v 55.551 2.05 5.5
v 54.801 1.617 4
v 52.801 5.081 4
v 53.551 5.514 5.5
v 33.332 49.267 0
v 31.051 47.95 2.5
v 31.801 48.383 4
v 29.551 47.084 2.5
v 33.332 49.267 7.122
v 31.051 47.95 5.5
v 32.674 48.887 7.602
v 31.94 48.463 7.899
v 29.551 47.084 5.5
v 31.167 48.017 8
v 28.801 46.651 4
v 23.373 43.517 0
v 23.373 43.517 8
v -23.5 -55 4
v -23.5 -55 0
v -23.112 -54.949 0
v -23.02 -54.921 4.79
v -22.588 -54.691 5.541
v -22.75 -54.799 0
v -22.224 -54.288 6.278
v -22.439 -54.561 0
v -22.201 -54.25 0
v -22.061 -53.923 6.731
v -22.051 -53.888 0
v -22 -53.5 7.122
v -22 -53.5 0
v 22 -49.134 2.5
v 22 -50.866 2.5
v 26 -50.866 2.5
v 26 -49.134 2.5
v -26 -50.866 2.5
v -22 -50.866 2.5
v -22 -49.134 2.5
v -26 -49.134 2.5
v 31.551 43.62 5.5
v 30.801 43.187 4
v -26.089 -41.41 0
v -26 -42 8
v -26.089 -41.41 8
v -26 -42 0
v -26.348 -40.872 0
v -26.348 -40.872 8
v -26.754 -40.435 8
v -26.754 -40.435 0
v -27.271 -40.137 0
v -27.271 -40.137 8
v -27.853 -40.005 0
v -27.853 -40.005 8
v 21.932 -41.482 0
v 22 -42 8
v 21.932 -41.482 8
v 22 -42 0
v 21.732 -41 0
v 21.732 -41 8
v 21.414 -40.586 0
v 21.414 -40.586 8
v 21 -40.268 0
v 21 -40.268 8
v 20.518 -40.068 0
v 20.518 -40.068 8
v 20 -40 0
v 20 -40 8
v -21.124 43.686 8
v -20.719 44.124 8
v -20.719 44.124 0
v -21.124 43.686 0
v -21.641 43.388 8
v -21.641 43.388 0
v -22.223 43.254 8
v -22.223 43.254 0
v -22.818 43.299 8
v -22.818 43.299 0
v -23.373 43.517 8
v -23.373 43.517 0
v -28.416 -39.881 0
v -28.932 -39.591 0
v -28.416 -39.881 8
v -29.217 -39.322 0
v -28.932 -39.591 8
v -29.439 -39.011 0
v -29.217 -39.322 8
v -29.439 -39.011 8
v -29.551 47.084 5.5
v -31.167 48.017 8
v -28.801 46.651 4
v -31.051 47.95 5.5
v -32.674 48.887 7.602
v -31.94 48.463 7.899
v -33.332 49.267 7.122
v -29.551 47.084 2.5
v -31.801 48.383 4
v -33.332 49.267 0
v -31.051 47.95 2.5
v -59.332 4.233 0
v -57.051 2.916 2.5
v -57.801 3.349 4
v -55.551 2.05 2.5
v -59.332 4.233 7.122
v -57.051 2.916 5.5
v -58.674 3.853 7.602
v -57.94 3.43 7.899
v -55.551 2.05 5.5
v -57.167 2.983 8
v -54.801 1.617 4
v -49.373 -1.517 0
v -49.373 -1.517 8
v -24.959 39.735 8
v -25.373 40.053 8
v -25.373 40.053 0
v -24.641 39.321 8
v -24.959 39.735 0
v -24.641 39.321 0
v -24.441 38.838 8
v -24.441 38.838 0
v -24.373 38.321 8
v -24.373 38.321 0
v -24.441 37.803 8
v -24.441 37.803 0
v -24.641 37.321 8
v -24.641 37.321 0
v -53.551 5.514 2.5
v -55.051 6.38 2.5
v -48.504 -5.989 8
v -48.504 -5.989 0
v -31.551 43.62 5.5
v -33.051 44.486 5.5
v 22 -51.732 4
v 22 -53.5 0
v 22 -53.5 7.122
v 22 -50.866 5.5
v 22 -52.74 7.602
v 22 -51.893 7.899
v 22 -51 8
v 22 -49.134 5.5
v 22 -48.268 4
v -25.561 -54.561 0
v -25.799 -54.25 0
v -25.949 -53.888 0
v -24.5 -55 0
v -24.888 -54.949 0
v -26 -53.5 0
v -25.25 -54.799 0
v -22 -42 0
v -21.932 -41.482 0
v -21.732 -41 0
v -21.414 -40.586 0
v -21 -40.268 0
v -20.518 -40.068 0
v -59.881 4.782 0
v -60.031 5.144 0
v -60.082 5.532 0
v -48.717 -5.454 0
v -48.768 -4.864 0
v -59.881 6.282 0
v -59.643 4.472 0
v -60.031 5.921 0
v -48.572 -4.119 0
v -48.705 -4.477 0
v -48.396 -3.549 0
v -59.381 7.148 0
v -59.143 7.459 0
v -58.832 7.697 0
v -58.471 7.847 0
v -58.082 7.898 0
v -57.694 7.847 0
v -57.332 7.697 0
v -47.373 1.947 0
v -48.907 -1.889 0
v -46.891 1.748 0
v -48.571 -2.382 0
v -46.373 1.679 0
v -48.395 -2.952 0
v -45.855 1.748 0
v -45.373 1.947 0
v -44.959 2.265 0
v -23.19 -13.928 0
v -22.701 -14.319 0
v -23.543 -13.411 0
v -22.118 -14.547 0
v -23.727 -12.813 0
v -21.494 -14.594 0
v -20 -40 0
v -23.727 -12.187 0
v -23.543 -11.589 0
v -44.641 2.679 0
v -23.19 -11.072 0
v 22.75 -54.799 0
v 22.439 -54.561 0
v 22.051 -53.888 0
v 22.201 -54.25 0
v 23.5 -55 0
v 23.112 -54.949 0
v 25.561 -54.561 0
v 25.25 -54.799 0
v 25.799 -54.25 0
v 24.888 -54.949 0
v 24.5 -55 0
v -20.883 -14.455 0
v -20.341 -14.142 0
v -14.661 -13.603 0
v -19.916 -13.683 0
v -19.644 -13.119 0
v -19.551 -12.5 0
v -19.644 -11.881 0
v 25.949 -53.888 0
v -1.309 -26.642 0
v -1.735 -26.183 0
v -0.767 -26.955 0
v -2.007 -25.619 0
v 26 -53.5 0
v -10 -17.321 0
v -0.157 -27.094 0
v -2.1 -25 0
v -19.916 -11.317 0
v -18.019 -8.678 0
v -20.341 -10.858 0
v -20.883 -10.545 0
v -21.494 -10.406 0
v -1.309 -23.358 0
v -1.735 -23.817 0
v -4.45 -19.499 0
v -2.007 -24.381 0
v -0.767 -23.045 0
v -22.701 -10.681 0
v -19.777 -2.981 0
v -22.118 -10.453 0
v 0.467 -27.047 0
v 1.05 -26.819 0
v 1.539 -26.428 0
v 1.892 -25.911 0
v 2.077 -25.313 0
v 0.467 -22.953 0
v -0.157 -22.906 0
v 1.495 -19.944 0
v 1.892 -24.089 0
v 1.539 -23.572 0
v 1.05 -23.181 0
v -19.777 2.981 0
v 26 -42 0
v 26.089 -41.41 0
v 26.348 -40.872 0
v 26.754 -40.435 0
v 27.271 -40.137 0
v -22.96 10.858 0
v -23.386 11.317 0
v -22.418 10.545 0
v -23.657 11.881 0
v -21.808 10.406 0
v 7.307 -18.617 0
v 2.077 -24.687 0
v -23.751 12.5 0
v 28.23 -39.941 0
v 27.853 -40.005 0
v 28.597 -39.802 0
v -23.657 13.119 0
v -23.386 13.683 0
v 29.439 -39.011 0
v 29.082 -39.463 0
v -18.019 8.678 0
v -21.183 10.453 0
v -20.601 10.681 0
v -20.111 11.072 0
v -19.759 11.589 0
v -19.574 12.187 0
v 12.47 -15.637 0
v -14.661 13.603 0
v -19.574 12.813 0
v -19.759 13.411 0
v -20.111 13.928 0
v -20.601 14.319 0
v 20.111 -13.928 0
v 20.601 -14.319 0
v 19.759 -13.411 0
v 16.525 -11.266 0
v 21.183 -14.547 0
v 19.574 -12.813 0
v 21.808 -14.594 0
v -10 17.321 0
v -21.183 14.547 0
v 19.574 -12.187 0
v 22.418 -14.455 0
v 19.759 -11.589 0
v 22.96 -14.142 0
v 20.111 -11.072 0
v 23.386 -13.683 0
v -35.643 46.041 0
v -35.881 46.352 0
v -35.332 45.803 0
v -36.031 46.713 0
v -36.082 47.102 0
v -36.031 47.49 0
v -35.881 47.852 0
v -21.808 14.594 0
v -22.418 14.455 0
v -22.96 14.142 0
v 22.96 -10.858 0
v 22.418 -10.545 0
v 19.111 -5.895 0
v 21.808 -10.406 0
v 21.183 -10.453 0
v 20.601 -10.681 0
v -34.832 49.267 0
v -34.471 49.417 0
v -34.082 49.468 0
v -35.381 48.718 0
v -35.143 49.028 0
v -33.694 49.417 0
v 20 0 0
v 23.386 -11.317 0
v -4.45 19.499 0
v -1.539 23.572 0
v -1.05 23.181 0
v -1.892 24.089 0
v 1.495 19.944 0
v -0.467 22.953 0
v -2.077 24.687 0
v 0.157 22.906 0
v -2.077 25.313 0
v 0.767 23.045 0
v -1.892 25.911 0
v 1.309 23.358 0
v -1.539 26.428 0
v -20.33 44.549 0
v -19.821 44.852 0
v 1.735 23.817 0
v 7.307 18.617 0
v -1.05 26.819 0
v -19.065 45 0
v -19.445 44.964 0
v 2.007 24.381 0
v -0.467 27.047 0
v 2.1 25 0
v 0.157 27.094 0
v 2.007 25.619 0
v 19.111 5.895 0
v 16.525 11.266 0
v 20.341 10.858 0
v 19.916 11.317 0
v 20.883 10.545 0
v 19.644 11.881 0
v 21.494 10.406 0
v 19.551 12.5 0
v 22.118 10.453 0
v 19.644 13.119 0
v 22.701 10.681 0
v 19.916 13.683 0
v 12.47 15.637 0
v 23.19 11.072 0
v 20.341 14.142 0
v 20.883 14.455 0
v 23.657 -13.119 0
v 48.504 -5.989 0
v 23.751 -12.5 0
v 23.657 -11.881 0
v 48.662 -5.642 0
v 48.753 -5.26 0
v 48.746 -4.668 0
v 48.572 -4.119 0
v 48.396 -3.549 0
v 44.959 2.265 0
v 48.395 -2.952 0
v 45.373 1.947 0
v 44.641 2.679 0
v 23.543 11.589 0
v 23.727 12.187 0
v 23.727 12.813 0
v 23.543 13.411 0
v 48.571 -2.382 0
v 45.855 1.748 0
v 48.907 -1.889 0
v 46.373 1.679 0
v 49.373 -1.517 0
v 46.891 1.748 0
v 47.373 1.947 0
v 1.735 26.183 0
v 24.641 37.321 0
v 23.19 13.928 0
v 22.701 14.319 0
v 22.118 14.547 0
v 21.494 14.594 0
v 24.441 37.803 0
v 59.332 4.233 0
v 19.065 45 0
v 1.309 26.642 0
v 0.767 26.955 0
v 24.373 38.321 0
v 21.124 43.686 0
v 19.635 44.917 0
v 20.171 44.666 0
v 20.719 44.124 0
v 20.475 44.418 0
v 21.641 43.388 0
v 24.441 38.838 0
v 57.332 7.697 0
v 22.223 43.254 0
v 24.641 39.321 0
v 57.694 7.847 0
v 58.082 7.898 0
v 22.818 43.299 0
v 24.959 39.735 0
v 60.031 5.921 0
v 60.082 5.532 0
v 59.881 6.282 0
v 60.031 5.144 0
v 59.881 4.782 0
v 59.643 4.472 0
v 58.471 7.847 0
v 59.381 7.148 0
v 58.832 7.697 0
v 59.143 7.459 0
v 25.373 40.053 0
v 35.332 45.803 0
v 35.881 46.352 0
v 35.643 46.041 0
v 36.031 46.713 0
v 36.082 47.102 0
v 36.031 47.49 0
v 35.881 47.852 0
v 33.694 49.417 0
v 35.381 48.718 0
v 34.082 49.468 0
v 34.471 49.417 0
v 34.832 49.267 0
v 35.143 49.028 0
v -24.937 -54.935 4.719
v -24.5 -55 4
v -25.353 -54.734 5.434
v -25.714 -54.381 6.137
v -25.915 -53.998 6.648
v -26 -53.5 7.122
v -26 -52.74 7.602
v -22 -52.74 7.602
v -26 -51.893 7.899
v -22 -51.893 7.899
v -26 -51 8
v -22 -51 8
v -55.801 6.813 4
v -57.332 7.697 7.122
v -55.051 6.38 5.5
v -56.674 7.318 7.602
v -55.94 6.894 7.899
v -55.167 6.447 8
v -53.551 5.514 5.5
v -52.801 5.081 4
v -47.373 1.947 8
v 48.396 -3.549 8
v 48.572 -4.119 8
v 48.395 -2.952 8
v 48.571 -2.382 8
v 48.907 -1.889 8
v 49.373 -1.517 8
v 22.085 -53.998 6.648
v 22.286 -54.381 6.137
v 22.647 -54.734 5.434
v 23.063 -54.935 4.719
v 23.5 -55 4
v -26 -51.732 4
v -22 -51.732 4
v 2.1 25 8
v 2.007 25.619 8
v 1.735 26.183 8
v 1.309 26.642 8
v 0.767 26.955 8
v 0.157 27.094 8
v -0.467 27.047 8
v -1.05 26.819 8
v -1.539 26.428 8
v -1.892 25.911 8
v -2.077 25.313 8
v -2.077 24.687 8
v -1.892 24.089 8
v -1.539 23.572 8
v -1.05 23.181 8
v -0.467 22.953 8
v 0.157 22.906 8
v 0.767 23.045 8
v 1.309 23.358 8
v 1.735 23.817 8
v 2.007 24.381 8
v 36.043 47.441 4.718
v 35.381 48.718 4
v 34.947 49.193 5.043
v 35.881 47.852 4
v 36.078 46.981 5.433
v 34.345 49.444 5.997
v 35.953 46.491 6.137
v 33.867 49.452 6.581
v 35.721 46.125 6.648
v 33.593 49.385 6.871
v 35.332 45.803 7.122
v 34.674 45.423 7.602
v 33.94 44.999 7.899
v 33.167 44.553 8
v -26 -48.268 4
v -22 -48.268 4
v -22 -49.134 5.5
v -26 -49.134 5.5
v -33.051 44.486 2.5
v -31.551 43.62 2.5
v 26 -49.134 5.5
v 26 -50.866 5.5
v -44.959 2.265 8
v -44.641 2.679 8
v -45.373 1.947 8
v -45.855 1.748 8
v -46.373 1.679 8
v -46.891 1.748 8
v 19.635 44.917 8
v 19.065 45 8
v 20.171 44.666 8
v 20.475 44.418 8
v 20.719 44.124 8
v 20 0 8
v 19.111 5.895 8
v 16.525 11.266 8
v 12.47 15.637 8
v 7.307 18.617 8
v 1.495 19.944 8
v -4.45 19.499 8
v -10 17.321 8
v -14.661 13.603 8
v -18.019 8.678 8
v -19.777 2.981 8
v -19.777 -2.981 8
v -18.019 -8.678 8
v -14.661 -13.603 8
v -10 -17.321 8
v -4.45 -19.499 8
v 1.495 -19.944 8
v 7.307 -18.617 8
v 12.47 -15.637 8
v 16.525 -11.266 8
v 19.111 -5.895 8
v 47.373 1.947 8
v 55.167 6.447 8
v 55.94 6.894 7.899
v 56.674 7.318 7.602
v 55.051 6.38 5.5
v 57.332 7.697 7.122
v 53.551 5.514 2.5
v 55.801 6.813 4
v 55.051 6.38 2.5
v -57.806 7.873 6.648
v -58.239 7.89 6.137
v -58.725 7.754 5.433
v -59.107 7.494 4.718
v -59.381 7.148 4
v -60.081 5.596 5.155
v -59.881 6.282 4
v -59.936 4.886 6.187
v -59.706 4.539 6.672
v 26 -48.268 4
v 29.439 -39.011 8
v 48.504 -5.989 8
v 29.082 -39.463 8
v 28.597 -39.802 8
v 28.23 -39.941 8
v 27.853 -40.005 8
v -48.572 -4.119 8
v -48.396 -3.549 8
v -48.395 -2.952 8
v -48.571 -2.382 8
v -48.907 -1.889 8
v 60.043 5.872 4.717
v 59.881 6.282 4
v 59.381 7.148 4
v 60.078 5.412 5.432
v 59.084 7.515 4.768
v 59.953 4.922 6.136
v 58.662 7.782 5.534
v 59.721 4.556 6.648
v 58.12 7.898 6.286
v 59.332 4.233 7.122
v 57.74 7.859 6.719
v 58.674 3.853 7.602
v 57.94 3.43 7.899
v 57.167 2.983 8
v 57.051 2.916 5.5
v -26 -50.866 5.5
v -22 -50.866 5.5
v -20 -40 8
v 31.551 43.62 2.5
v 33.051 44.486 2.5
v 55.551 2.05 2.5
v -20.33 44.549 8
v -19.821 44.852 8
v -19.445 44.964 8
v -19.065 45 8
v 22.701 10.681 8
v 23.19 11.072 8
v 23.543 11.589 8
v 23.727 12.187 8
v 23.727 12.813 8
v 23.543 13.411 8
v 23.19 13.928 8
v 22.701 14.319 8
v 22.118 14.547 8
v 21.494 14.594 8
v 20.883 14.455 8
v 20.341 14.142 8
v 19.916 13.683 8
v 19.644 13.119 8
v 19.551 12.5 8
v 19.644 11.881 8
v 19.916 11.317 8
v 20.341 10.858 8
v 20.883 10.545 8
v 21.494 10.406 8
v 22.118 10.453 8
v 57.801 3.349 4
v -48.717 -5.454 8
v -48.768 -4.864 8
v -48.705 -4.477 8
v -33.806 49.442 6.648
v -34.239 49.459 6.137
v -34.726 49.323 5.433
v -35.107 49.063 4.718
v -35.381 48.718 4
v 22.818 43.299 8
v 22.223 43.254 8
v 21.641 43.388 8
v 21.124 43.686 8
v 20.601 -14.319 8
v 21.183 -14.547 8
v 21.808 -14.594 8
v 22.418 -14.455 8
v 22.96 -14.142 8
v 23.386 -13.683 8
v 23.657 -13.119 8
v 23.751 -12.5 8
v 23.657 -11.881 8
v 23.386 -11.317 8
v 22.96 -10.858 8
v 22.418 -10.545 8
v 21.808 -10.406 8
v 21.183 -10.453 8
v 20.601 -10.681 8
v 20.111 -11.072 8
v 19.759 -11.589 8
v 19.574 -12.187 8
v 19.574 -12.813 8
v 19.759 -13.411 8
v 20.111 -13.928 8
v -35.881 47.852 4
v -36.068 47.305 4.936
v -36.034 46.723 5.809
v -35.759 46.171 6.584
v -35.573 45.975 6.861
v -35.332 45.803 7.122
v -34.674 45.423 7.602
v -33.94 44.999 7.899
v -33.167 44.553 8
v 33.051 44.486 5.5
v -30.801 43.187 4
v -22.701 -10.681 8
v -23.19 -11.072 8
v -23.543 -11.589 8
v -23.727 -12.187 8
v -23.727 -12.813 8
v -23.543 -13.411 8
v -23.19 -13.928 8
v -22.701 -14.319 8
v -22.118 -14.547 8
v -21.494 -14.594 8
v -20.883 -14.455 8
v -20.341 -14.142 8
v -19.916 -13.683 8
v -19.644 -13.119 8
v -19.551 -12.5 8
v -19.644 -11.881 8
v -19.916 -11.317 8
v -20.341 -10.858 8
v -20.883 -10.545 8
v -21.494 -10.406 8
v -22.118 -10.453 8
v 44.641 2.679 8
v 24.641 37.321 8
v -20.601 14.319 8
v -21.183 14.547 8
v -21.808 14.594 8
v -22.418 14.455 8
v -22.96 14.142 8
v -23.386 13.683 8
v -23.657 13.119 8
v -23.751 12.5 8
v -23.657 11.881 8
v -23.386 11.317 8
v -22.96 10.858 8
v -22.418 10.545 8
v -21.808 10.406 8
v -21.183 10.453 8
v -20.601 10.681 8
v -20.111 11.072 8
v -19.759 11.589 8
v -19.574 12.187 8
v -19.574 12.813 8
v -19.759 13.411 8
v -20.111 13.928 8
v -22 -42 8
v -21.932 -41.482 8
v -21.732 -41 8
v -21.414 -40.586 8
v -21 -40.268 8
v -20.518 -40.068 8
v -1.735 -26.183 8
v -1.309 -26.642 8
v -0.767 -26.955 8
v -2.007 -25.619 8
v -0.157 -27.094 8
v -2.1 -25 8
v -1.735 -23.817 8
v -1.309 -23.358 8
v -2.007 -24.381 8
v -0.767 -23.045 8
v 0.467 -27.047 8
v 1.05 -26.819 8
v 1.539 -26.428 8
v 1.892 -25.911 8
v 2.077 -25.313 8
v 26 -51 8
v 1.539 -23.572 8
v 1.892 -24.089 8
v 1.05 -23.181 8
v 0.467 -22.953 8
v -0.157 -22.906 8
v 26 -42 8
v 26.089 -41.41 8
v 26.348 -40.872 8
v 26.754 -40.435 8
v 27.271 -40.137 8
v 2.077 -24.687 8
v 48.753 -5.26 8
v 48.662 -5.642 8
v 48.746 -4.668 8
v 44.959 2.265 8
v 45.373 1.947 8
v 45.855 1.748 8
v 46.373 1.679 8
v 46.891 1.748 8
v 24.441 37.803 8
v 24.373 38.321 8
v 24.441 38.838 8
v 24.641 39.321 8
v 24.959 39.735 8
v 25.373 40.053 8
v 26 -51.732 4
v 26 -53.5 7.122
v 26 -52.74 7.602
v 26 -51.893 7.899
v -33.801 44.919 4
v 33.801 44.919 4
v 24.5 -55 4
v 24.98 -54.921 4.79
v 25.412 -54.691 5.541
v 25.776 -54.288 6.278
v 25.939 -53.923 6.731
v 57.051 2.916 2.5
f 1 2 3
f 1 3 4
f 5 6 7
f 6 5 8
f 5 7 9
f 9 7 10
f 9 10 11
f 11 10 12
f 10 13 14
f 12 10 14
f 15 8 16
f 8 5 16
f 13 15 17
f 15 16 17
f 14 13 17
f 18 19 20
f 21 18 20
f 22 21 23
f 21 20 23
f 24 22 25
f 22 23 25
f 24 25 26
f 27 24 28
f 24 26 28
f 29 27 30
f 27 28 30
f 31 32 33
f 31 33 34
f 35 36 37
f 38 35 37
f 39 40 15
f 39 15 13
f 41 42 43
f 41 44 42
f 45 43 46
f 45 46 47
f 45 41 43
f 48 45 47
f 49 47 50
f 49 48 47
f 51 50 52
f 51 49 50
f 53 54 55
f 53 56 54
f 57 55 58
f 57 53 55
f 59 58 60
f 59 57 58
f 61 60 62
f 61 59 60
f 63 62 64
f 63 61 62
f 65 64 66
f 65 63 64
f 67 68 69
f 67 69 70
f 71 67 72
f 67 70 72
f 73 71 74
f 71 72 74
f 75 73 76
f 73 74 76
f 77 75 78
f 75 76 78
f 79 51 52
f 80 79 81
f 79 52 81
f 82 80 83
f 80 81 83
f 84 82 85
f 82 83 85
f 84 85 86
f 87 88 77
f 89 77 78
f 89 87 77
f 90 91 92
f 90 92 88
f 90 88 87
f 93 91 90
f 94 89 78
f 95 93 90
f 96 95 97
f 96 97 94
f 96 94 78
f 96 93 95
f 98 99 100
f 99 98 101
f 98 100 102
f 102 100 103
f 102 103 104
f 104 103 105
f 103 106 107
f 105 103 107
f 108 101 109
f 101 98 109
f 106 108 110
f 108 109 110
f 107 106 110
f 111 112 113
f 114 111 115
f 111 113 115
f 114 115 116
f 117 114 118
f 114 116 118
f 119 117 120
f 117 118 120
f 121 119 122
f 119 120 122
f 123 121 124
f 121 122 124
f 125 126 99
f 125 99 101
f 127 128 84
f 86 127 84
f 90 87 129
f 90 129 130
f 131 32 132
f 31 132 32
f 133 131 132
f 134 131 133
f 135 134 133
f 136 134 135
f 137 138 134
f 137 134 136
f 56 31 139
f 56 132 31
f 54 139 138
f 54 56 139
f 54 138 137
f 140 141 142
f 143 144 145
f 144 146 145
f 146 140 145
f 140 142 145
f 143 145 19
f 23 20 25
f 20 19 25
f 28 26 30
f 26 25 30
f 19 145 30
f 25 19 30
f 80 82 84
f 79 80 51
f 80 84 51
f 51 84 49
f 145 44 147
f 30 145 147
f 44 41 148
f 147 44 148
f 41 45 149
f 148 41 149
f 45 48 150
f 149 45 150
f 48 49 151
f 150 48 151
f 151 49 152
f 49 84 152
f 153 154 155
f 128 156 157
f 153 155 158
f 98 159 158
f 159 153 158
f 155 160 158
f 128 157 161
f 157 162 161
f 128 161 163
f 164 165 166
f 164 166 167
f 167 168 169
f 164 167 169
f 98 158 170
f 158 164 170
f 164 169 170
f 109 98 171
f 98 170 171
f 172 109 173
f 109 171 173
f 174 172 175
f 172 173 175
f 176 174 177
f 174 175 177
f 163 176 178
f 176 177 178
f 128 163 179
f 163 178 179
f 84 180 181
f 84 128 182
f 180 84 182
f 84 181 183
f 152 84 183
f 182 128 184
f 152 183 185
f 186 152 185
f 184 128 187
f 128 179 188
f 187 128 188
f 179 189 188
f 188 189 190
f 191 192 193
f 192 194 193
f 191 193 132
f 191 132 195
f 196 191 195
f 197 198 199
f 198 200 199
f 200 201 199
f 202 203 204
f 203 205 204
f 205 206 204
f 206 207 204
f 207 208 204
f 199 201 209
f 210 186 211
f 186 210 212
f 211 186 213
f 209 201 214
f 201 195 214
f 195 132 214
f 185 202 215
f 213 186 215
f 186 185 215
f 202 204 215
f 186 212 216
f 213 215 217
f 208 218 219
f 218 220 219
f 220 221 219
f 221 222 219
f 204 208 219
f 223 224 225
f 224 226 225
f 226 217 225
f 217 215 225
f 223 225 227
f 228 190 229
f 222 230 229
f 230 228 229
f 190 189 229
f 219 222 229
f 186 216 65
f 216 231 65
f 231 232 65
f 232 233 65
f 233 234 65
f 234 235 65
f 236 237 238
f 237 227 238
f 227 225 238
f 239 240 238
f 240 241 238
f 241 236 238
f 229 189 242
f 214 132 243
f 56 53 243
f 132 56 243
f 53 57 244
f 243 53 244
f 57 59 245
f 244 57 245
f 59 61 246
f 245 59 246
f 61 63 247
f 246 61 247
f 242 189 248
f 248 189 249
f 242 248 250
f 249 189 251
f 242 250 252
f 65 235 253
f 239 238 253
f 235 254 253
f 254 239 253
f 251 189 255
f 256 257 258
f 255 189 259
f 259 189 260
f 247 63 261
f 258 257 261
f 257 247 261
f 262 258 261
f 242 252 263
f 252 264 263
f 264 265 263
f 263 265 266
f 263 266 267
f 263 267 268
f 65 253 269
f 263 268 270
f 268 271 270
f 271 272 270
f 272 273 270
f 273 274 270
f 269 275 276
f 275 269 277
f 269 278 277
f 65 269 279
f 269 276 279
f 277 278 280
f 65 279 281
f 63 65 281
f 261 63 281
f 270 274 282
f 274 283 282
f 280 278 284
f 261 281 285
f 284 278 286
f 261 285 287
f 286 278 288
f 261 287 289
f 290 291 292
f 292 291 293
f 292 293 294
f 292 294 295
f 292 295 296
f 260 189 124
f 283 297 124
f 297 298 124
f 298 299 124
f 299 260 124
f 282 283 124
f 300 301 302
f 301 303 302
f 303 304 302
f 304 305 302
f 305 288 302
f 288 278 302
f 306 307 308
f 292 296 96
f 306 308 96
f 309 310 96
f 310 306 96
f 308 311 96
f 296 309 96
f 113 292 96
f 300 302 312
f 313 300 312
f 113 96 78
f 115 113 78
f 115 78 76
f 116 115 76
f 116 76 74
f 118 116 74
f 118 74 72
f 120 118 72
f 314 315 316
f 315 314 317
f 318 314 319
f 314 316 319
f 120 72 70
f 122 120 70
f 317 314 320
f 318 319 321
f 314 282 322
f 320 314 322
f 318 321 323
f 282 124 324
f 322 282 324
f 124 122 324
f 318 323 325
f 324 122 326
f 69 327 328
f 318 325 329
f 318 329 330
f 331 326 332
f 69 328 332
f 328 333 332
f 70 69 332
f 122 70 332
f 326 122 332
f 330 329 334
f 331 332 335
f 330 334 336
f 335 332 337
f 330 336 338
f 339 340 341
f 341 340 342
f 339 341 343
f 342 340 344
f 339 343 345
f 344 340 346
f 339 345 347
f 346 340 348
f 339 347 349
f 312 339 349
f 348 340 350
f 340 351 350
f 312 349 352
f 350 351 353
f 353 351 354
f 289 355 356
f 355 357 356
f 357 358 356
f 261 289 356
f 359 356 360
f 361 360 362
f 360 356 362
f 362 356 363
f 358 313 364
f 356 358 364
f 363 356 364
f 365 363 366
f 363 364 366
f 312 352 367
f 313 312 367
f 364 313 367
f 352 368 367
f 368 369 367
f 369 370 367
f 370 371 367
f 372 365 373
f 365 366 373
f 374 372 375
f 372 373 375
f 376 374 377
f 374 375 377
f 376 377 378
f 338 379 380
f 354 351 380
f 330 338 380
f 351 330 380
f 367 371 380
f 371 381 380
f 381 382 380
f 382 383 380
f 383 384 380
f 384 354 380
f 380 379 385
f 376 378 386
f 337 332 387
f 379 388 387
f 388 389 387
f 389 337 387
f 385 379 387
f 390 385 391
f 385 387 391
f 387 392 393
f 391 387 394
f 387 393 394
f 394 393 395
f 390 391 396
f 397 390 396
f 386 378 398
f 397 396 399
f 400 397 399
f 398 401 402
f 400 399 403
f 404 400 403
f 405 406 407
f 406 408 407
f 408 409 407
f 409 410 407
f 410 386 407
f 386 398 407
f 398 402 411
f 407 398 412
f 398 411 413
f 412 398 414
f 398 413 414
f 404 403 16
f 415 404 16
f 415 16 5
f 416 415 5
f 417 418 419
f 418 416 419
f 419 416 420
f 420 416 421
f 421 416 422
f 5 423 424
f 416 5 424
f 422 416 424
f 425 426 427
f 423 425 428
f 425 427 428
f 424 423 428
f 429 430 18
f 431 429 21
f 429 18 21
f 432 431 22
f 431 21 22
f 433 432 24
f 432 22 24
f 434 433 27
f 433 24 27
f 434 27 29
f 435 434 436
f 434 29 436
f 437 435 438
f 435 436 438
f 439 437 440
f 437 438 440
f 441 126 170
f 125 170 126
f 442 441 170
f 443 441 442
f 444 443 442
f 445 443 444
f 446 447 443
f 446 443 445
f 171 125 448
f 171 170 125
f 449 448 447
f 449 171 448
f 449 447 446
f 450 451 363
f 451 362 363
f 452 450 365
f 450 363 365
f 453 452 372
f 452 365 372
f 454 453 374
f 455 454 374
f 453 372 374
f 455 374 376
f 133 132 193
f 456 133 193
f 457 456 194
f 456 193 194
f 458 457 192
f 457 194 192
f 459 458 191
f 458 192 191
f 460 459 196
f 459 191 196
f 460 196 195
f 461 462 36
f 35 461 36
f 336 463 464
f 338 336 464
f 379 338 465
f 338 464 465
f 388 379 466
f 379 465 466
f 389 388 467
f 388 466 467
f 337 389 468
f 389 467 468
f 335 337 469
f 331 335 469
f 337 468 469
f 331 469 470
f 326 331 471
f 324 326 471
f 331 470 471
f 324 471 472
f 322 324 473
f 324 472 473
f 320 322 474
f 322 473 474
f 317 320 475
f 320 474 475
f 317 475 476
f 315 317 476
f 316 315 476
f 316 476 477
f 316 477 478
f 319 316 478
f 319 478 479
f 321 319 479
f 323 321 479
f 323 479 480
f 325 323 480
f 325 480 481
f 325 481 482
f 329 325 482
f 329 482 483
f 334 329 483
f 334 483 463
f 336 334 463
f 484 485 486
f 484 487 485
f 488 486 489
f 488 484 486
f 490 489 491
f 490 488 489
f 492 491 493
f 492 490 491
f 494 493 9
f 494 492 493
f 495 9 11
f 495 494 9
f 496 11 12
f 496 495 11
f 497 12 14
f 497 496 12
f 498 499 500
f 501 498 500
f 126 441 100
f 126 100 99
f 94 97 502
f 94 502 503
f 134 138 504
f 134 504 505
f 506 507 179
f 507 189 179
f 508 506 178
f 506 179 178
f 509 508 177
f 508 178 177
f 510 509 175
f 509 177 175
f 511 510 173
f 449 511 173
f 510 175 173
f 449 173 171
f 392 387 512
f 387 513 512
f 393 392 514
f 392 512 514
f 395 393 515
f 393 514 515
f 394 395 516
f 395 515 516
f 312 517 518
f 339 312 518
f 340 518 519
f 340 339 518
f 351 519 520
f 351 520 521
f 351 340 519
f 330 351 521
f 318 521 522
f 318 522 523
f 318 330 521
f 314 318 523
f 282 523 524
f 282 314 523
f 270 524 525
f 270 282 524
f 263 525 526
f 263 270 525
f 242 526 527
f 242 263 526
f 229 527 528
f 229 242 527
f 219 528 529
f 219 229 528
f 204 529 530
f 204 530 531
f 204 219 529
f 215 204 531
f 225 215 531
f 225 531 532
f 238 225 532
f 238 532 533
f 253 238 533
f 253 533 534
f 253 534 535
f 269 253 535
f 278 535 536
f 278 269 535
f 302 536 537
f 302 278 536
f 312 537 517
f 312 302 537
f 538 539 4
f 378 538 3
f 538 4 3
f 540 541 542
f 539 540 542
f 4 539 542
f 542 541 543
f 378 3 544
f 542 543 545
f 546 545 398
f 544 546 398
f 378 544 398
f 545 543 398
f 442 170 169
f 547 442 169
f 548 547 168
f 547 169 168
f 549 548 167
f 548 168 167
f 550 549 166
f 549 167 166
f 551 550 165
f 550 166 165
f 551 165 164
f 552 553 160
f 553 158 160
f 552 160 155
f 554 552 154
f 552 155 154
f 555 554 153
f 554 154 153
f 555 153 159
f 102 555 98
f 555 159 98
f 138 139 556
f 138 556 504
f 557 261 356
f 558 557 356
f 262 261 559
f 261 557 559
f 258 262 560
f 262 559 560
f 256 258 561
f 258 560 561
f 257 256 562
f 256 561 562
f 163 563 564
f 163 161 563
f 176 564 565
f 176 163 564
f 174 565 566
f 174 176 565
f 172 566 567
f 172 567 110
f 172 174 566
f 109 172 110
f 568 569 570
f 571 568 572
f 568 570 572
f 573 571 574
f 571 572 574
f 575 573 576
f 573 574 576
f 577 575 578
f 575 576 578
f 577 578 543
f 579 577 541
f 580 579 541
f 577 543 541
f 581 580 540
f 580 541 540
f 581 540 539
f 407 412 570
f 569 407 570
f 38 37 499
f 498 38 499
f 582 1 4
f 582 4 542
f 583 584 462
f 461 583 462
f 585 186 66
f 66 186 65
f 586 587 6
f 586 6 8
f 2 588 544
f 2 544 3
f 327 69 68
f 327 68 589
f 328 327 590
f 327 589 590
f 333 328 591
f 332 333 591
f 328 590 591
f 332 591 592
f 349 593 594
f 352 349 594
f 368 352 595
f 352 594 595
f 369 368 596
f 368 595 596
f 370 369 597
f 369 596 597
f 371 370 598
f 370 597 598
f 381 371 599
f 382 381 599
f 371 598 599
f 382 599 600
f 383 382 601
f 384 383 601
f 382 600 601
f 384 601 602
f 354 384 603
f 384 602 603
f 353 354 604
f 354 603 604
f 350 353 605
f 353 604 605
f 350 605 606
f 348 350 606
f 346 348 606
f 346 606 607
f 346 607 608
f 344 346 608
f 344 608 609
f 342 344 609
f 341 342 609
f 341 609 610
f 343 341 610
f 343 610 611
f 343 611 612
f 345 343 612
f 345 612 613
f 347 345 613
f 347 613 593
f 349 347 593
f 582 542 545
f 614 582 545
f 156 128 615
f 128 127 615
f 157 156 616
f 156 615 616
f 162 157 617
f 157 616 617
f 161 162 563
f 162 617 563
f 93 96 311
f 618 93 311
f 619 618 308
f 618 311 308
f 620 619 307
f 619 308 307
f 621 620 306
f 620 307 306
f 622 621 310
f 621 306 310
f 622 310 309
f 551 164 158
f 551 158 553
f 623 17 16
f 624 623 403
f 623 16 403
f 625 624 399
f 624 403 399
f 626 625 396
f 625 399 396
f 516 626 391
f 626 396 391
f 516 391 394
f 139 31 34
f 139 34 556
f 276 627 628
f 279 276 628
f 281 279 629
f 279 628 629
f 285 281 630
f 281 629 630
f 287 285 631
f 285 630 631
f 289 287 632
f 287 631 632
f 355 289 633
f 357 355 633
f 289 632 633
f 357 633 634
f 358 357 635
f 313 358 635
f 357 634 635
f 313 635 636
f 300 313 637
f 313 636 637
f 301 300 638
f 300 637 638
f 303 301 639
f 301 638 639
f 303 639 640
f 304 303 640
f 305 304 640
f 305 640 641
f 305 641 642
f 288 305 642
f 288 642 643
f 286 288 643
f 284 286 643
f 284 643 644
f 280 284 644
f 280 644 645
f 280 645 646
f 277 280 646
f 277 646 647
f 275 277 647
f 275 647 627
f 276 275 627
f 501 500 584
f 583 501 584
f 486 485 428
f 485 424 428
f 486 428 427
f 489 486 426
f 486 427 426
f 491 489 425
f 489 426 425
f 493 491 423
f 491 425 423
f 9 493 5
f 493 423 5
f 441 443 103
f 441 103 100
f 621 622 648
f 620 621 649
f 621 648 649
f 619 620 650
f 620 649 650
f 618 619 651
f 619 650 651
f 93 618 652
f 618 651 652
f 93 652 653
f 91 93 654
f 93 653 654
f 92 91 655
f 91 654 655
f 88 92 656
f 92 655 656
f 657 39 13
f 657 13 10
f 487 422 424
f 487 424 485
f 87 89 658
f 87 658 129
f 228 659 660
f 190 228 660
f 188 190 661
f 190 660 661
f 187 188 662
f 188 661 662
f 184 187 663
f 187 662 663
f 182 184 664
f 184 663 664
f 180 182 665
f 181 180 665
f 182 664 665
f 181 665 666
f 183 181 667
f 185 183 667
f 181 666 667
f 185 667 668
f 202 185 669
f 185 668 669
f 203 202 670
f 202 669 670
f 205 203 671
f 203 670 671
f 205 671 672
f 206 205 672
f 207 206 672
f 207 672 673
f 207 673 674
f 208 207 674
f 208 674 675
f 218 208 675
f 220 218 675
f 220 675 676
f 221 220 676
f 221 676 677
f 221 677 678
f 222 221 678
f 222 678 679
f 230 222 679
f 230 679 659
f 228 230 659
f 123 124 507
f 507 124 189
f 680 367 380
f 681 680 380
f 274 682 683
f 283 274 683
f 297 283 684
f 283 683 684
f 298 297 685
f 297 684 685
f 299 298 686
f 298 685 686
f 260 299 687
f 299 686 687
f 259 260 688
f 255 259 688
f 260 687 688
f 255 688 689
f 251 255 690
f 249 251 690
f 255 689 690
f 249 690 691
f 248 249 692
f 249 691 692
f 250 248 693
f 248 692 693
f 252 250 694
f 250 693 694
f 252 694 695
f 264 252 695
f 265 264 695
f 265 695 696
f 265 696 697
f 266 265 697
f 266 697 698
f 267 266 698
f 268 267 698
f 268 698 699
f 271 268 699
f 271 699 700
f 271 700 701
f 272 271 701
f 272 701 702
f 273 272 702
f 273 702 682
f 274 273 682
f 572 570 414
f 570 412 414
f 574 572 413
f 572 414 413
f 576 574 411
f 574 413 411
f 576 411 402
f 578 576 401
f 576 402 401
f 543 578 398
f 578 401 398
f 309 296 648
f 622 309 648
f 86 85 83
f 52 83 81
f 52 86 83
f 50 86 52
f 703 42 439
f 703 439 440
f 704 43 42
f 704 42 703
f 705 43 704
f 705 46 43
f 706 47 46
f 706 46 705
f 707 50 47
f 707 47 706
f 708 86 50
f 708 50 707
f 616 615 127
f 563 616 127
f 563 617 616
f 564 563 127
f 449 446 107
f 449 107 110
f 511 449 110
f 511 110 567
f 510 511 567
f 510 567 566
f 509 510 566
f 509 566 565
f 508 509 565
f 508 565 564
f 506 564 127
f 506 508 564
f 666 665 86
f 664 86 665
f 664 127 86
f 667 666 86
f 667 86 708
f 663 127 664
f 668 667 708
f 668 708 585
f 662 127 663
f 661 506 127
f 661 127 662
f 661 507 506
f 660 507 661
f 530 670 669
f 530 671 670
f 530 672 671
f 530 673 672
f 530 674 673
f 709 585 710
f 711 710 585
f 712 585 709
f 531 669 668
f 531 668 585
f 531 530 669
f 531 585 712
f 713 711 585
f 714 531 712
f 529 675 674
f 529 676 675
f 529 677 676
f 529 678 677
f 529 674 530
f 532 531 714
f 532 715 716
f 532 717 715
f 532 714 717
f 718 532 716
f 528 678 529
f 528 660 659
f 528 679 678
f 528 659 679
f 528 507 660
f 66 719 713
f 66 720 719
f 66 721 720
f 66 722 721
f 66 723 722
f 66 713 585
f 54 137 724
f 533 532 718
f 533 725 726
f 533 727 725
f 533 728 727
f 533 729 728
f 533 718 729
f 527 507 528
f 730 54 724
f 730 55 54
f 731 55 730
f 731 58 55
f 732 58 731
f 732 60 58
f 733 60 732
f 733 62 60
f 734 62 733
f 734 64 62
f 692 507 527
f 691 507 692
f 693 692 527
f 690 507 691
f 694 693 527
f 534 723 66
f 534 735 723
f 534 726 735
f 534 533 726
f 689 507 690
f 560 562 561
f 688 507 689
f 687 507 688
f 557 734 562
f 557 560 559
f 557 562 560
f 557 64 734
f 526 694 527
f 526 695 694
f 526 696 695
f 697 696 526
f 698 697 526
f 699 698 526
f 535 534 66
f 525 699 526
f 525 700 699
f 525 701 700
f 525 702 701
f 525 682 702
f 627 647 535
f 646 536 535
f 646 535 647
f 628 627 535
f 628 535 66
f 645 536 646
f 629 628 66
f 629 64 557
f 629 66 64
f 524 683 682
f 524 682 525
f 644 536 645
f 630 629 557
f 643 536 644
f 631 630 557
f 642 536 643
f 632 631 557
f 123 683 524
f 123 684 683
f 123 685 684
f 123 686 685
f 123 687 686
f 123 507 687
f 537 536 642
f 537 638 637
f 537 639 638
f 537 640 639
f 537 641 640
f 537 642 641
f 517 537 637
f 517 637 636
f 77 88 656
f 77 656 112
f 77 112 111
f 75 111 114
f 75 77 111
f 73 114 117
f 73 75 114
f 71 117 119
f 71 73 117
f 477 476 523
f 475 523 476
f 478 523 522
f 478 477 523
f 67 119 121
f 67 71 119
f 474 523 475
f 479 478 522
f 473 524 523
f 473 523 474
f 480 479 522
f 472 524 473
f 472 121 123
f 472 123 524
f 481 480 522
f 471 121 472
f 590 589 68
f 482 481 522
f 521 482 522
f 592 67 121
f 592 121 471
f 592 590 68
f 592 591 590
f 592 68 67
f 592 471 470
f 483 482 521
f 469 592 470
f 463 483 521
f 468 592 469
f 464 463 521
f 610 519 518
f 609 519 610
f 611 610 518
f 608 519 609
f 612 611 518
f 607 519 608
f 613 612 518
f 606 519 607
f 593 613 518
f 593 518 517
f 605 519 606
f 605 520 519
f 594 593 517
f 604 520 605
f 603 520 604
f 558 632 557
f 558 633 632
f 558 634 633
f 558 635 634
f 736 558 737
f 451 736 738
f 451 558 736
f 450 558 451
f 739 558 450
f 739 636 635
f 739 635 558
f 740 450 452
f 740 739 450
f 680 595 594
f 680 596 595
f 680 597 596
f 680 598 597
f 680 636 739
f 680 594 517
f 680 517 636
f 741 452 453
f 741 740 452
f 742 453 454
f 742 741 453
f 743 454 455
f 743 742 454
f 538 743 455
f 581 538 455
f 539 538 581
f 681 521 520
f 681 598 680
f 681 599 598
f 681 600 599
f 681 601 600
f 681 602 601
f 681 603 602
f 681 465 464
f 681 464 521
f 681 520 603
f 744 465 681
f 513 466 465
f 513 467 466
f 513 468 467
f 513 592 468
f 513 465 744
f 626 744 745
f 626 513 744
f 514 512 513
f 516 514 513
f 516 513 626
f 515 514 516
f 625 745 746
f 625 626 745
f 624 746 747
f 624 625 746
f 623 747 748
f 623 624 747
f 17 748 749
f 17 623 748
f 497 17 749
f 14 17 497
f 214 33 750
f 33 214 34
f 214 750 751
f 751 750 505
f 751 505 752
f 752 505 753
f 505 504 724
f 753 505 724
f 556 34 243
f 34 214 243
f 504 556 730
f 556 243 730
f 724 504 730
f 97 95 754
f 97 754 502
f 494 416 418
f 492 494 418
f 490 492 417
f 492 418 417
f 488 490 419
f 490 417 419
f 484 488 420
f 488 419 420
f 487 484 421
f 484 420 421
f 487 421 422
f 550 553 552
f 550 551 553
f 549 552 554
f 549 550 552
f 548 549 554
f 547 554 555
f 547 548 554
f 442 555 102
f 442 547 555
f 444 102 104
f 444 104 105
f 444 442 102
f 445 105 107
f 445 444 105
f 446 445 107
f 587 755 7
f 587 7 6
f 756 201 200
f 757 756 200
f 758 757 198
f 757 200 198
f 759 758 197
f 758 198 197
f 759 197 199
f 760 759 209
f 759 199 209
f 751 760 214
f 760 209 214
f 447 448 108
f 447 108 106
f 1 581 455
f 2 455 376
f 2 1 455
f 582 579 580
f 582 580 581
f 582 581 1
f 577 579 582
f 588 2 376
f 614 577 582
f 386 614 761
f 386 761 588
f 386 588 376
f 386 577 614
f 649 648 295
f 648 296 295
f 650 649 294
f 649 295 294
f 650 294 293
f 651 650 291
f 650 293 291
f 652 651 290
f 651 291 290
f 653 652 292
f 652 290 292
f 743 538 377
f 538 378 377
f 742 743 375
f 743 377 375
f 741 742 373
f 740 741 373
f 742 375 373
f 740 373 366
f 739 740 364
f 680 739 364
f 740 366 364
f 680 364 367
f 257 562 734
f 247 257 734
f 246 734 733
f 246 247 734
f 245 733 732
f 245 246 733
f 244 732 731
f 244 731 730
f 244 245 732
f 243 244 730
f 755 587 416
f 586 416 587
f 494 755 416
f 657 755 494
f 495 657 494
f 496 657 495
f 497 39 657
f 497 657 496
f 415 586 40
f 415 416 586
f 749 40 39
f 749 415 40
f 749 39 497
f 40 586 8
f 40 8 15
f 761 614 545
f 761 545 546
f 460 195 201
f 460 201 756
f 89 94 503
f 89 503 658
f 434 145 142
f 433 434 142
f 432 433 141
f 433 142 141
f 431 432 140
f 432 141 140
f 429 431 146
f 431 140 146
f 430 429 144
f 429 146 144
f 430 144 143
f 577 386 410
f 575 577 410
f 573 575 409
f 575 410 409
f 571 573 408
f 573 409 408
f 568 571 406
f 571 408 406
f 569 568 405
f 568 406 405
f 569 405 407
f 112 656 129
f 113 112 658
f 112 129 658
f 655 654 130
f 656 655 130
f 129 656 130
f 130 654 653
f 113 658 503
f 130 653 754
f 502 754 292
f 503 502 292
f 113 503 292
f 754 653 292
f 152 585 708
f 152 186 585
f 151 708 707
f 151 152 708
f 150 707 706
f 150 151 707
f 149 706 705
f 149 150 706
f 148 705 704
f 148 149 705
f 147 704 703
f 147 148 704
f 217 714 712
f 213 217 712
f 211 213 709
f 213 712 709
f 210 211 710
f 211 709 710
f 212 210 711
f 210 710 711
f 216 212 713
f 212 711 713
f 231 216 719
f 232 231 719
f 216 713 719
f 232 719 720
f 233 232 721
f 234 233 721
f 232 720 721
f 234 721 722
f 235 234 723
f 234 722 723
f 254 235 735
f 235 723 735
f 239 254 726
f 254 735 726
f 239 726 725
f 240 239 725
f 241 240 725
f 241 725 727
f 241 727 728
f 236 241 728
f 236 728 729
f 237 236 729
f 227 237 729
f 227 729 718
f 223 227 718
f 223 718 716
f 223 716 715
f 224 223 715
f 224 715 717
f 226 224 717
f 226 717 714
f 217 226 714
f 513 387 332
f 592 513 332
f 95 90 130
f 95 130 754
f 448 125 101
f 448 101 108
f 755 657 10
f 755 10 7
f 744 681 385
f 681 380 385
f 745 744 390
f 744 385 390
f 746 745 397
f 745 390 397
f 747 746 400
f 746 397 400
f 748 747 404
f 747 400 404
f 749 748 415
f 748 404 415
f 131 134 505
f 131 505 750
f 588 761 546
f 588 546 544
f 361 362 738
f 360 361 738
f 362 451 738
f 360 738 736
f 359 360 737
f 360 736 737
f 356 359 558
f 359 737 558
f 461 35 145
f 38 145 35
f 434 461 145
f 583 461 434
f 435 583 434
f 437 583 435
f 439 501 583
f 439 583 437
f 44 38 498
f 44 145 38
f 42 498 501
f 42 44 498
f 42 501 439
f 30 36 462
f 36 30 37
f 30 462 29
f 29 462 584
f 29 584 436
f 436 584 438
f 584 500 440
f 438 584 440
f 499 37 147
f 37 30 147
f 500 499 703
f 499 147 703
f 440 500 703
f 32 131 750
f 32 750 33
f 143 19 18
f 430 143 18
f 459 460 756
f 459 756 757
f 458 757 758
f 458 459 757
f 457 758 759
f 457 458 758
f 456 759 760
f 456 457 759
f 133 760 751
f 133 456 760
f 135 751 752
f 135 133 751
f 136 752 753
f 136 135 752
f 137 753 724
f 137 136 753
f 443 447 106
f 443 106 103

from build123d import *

# Parameters (mm, degrees)
SKETCH1_R                = 20
BOSS_EXTRUDE1_DEPTH      = 8
BOSS_EXTRUDE3_START      = 22
BOSS_EXTRUDE3_DEPTH      = 4
CIRPATTERN1_COUNT        = 3
CIRPATTERN1_START        = 22
CIRPATTERN1_COPY_1_DEPTH = 4
CIRPATTERN1_COPY_2_DEPTH = 4
SKETCH4_R                = 2.1
CUT_EXTRUDE1_DEPTH       = 83.250631167
CIRPATTERN2_COUNT        = 6
FILLET2_R                = 2
FILLET4_R                = 1.5
FILLET5_R                = 2


with BuildPart() as part:
    # Sketch1 → Boss-Extrude1 (new body)
    with BuildSketch(Plane.XY):
        Polygon((49.074772881, -5), (20.207259422, 45), (-20.207259422, 45), (-49.074772881, -5), (-28.867513459, -40), (28.867513459, -40), align=None)
        Circle(SKETCH1_R, mode=Mode.SUBTRACT)
    extrude(amount=BOSS_EXTRUDE1_DEPTH)

    # Sketch3 → Boss-Extrude3 (add)
    with BuildSketch(Plane(origin=(0, 0, 0), x_dir=(0, 0, -1), z_dir=(1, 0, 0)).offset(BOSS_EXTRUDE3_START)):
        with BuildLine():
            Line((0, -40), (0, -55))
            Line((0, -55), (-4, -55))
            ThreePointArc((-4, -55), (-6.828427125, -53.828427125), (-8, -51))
            Line((-8, -51), (-8, -40))
            Line((-8, -40), (0, -40))
        make_face()
        Polygon((-4, -48.267949192), (-5.5, -49.133974596), (-5.5, -50.866025404), (-4, -51.732050808), (-2.5, -50.866025404), (-2.5, -49.133974596), align=None, mode=Mode.SUBTRACT)
    boss_extrude3 = extrude(amount=BOSS_EXTRUDE3_DEPTH)

    # Mirror1: Boss-Extrude3 across plane
    add(boss_extrude3.mirror(Plane(origin=(0, 0, 0), x_dir=(0, 0, 1), z_dir=(1, 0, 0))))

    # CirPattern1: Boss-Extrude3 ×3 about axis
    cirpattern1_axis = Axis((0, 0, 0), (0, 0, 1))
    for i in range(1, CIRPATTERN1_COUNT):
        add(boss_extrude3.rotate(cirpattern1_axis, i * 360 / CIRPATTERN1_COUNT))

    # CirPattern1 copy 1 sketch → CirPattern1 copy 1 (add)
    with BuildSketch(Plane(origin=(0, 0, 0), x_dir=(0, 0, -1), z_dir=(0.4999999999999998, -0.8660254037844387, 0)).offset(CIRPATTERN1_START)):
        with BuildLine():
            Line((0, 40), (0, 55))
            Line((0, 55), (-4, 55))
            ThreePointArc((-4, 55), (-6.828427125, 53.828427125), (-8, 51))
            Line((-8, 51), (-8, 40))
            Line((-8, 40), (0, 40))
        make_face()
        Polygon((-4, 48.267949192), (-5.5, 49.133974596), (-5.5, 50.866025404), (-4, 51.732050808), (-2.5, 50.866025404), (-2.5, 49.133974596), align=None, mode=Mode.SUBTRACT)
    extrude(amount=CIRPATTERN1_COPY_1_DEPTH)

    # CirPattern1 copy 2 sketch → CirPattern1 copy 2 (add)
    with BuildSketch(Plane(origin=(0, 0, 0), x_dir=(0, 0, -1), z_dir=(0.5000000000000004, 0.8660254037844384, 0)).offset(CIRPATTERN1_START)):
        with BuildLine():
            Line((0, 40), (0, 55))
            Line((0, 55), (-4, 55))
            ThreePointArc((-4, 55), (-6.828427125, 53.828427125), (-8, 51))
            Line((-8, 51), (-8, 40))
            Line((-8, 40), (0, 40))
        make_face()
        Polygon((-4, 48.267949192), (-5.5, 49.133974596), (-5.5, 50.866025404), (-4, 51.732050808), (-2.5, 50.866025404), (-2.5, 49.133974596), align=None, mode=Mode.SUBTRACT)
    extrude(amount=CIRPATTERN1_COPY_2_DEPTH)

    # Sketch4 → Cut-Extrude1 (cut, through all)
    with BuildSketch(Plane.XY.offset(8)):
        with Locations((0, 25)):
            Circle(SKETCH4_R)
    cut_extrude1 = extrude(amount=-CUT_EXTRUDE1_DEPTH, mode=Mode.SUBTRACT)

    # CirPattern2: Cut-Extrude1 ×6 about axis
    cirpattern2_axis = Axis((0, 0, 0), (0, 0, 1))
    for i in range(1, CIRPATTERN2_COUNT):
        add(cut_extrude1.rotate(cirpattern2_axis, i * 360 / CIRPATTERN2_COUNT), mode=Mode.SUBTRACT)

    # Fillet2
    fillet2_edges = [part.edges().sort_by_distance(p)[0] for p in [
        (-26, -40, 4),
        (-22, -40, 4),
        (26, -40, 4),
        (22, -40, 4),
        (-47.641016151, -2.516660498, 4),
        (-23.641016151, 39.052558883, 4),
        (-45.641016151, 0.947441117, 4),
        (-21.641016151, 42.516660498, 4),
        (23.641016151, 39.052558883, 4),
        (21.641016151, 42.516660498, 4),
        (45.641016151, 0.947441117, 4),
        (47.641016151, -2.516660498, 4),
    ]]
    fillet(fillet2_edges, radius=FILLET2_R)

    # Fillet4
    # the kernel refuses this fillet: 1.5 mm, written as the material it takes off along each edge
    with BuildSketch(Plane(origin=(36.631397208, 46.552558883, -3.75), x_dir=(-0.8660254037844387, -0.5, -1.7763568394002503e-15), z_dir=(0, 0, 1)), Plane(origin=(34.631397208, 50.016660498, -3.75), x_dir=(0.5, -0.8660254037844387, 0), z_dir=(0, 0, 1)), Plane(origin=(58.631397208, 8.447441117, -3.75), x_dir=(0.4999999999999998, -0.8660254037844389, 0), z_dir=(0, 0, 1)), Plane(origin=(60.631397208, 4.983339502, -3.75), x_dir=(-0.866025403784439, -0.4999999999999993, -1.7763568394002505e-15), z_dir=(0, 0, 1)), Plane(origin=(-36.631397208, 46.552558883, -3.75), x_dir=(0.5, 0.8660254037844387, 0), z_dir=(0, 0, 1)), Plane(origin=(-34.631397208, 50.016660498, -3.75), x_dir=(0.8660254037844398, -0.49999999999999795, -1.7763568394002505e-15), z_dir=(0, 0, 1))) as fillet4_piece_1:
        with BuildLine():
            CenterArc((FILLET4_R, -FILLET4_R), FILLET4_R, 90, 90)
            Line((0, -FILLET4_R), (0, 0))
            Line((0, 0), (FILLET4_R, 0))
        make_face()
    extrude(amount=11.5, mode=Mode.SUBTRACT)
    with BuildSketch(Plane(origin=(-60.631397208, 4.983339502, -3.75), x_dir=(0.8660254037844379, -0.5000000000000011, -1.7763568394002503e-15), z_dir=(0, 0, 1)), Plane(origin=(-58.631397208, 8.447441117, -3.75), x_dir=(-0.5, -0.8660254037844387, 0), z_dir=(0, 0, 1)), Plane(origin=(26, -55, -3.75), x_dir=(0, 1, 0), z_dir=(0, 0, 1)), Plane(origin=(22, -55, -3.75), x_dir=(1, 0, 0), z_dir=(0, 0, 1)), Plane(origin=(-26, -55, -3.75), x_dir=(1, 0, 0), z_dir=(0, 0, 1)), Plane(origin=(-22, -55, -3.75), x_dir=(0, 1, 0), z_dir=(0, 0, 1))) as fillet4_piece_2:
        with BuildLine():
            CenterArc((FILLET4_R, FILLET4_R), FILLET4_R, 180, 90)
            Line((0, FILLET4_R), (0, 0))
            Line((0, 0), (FILLET4_R, 0))
        make_face()
    extrude(amount=11.5, mode=Mode.SUBTRACT)

    # Fillet5
    fillet5_edges = [part.edges().sort_by_distance(p)[0] for p in [
        (20.207259422, 45, 4),
        (-20.207259422, 45, 4),
        (-49.074772881, -5, 4),
        (-28.867513459, -40, 4),
        (49.074772881, -5, 4),
        (28.867513459, -40, 4),
    ]]
    fillet(fillet5_edges, radius=FILLET5_R)


solid = part.part
